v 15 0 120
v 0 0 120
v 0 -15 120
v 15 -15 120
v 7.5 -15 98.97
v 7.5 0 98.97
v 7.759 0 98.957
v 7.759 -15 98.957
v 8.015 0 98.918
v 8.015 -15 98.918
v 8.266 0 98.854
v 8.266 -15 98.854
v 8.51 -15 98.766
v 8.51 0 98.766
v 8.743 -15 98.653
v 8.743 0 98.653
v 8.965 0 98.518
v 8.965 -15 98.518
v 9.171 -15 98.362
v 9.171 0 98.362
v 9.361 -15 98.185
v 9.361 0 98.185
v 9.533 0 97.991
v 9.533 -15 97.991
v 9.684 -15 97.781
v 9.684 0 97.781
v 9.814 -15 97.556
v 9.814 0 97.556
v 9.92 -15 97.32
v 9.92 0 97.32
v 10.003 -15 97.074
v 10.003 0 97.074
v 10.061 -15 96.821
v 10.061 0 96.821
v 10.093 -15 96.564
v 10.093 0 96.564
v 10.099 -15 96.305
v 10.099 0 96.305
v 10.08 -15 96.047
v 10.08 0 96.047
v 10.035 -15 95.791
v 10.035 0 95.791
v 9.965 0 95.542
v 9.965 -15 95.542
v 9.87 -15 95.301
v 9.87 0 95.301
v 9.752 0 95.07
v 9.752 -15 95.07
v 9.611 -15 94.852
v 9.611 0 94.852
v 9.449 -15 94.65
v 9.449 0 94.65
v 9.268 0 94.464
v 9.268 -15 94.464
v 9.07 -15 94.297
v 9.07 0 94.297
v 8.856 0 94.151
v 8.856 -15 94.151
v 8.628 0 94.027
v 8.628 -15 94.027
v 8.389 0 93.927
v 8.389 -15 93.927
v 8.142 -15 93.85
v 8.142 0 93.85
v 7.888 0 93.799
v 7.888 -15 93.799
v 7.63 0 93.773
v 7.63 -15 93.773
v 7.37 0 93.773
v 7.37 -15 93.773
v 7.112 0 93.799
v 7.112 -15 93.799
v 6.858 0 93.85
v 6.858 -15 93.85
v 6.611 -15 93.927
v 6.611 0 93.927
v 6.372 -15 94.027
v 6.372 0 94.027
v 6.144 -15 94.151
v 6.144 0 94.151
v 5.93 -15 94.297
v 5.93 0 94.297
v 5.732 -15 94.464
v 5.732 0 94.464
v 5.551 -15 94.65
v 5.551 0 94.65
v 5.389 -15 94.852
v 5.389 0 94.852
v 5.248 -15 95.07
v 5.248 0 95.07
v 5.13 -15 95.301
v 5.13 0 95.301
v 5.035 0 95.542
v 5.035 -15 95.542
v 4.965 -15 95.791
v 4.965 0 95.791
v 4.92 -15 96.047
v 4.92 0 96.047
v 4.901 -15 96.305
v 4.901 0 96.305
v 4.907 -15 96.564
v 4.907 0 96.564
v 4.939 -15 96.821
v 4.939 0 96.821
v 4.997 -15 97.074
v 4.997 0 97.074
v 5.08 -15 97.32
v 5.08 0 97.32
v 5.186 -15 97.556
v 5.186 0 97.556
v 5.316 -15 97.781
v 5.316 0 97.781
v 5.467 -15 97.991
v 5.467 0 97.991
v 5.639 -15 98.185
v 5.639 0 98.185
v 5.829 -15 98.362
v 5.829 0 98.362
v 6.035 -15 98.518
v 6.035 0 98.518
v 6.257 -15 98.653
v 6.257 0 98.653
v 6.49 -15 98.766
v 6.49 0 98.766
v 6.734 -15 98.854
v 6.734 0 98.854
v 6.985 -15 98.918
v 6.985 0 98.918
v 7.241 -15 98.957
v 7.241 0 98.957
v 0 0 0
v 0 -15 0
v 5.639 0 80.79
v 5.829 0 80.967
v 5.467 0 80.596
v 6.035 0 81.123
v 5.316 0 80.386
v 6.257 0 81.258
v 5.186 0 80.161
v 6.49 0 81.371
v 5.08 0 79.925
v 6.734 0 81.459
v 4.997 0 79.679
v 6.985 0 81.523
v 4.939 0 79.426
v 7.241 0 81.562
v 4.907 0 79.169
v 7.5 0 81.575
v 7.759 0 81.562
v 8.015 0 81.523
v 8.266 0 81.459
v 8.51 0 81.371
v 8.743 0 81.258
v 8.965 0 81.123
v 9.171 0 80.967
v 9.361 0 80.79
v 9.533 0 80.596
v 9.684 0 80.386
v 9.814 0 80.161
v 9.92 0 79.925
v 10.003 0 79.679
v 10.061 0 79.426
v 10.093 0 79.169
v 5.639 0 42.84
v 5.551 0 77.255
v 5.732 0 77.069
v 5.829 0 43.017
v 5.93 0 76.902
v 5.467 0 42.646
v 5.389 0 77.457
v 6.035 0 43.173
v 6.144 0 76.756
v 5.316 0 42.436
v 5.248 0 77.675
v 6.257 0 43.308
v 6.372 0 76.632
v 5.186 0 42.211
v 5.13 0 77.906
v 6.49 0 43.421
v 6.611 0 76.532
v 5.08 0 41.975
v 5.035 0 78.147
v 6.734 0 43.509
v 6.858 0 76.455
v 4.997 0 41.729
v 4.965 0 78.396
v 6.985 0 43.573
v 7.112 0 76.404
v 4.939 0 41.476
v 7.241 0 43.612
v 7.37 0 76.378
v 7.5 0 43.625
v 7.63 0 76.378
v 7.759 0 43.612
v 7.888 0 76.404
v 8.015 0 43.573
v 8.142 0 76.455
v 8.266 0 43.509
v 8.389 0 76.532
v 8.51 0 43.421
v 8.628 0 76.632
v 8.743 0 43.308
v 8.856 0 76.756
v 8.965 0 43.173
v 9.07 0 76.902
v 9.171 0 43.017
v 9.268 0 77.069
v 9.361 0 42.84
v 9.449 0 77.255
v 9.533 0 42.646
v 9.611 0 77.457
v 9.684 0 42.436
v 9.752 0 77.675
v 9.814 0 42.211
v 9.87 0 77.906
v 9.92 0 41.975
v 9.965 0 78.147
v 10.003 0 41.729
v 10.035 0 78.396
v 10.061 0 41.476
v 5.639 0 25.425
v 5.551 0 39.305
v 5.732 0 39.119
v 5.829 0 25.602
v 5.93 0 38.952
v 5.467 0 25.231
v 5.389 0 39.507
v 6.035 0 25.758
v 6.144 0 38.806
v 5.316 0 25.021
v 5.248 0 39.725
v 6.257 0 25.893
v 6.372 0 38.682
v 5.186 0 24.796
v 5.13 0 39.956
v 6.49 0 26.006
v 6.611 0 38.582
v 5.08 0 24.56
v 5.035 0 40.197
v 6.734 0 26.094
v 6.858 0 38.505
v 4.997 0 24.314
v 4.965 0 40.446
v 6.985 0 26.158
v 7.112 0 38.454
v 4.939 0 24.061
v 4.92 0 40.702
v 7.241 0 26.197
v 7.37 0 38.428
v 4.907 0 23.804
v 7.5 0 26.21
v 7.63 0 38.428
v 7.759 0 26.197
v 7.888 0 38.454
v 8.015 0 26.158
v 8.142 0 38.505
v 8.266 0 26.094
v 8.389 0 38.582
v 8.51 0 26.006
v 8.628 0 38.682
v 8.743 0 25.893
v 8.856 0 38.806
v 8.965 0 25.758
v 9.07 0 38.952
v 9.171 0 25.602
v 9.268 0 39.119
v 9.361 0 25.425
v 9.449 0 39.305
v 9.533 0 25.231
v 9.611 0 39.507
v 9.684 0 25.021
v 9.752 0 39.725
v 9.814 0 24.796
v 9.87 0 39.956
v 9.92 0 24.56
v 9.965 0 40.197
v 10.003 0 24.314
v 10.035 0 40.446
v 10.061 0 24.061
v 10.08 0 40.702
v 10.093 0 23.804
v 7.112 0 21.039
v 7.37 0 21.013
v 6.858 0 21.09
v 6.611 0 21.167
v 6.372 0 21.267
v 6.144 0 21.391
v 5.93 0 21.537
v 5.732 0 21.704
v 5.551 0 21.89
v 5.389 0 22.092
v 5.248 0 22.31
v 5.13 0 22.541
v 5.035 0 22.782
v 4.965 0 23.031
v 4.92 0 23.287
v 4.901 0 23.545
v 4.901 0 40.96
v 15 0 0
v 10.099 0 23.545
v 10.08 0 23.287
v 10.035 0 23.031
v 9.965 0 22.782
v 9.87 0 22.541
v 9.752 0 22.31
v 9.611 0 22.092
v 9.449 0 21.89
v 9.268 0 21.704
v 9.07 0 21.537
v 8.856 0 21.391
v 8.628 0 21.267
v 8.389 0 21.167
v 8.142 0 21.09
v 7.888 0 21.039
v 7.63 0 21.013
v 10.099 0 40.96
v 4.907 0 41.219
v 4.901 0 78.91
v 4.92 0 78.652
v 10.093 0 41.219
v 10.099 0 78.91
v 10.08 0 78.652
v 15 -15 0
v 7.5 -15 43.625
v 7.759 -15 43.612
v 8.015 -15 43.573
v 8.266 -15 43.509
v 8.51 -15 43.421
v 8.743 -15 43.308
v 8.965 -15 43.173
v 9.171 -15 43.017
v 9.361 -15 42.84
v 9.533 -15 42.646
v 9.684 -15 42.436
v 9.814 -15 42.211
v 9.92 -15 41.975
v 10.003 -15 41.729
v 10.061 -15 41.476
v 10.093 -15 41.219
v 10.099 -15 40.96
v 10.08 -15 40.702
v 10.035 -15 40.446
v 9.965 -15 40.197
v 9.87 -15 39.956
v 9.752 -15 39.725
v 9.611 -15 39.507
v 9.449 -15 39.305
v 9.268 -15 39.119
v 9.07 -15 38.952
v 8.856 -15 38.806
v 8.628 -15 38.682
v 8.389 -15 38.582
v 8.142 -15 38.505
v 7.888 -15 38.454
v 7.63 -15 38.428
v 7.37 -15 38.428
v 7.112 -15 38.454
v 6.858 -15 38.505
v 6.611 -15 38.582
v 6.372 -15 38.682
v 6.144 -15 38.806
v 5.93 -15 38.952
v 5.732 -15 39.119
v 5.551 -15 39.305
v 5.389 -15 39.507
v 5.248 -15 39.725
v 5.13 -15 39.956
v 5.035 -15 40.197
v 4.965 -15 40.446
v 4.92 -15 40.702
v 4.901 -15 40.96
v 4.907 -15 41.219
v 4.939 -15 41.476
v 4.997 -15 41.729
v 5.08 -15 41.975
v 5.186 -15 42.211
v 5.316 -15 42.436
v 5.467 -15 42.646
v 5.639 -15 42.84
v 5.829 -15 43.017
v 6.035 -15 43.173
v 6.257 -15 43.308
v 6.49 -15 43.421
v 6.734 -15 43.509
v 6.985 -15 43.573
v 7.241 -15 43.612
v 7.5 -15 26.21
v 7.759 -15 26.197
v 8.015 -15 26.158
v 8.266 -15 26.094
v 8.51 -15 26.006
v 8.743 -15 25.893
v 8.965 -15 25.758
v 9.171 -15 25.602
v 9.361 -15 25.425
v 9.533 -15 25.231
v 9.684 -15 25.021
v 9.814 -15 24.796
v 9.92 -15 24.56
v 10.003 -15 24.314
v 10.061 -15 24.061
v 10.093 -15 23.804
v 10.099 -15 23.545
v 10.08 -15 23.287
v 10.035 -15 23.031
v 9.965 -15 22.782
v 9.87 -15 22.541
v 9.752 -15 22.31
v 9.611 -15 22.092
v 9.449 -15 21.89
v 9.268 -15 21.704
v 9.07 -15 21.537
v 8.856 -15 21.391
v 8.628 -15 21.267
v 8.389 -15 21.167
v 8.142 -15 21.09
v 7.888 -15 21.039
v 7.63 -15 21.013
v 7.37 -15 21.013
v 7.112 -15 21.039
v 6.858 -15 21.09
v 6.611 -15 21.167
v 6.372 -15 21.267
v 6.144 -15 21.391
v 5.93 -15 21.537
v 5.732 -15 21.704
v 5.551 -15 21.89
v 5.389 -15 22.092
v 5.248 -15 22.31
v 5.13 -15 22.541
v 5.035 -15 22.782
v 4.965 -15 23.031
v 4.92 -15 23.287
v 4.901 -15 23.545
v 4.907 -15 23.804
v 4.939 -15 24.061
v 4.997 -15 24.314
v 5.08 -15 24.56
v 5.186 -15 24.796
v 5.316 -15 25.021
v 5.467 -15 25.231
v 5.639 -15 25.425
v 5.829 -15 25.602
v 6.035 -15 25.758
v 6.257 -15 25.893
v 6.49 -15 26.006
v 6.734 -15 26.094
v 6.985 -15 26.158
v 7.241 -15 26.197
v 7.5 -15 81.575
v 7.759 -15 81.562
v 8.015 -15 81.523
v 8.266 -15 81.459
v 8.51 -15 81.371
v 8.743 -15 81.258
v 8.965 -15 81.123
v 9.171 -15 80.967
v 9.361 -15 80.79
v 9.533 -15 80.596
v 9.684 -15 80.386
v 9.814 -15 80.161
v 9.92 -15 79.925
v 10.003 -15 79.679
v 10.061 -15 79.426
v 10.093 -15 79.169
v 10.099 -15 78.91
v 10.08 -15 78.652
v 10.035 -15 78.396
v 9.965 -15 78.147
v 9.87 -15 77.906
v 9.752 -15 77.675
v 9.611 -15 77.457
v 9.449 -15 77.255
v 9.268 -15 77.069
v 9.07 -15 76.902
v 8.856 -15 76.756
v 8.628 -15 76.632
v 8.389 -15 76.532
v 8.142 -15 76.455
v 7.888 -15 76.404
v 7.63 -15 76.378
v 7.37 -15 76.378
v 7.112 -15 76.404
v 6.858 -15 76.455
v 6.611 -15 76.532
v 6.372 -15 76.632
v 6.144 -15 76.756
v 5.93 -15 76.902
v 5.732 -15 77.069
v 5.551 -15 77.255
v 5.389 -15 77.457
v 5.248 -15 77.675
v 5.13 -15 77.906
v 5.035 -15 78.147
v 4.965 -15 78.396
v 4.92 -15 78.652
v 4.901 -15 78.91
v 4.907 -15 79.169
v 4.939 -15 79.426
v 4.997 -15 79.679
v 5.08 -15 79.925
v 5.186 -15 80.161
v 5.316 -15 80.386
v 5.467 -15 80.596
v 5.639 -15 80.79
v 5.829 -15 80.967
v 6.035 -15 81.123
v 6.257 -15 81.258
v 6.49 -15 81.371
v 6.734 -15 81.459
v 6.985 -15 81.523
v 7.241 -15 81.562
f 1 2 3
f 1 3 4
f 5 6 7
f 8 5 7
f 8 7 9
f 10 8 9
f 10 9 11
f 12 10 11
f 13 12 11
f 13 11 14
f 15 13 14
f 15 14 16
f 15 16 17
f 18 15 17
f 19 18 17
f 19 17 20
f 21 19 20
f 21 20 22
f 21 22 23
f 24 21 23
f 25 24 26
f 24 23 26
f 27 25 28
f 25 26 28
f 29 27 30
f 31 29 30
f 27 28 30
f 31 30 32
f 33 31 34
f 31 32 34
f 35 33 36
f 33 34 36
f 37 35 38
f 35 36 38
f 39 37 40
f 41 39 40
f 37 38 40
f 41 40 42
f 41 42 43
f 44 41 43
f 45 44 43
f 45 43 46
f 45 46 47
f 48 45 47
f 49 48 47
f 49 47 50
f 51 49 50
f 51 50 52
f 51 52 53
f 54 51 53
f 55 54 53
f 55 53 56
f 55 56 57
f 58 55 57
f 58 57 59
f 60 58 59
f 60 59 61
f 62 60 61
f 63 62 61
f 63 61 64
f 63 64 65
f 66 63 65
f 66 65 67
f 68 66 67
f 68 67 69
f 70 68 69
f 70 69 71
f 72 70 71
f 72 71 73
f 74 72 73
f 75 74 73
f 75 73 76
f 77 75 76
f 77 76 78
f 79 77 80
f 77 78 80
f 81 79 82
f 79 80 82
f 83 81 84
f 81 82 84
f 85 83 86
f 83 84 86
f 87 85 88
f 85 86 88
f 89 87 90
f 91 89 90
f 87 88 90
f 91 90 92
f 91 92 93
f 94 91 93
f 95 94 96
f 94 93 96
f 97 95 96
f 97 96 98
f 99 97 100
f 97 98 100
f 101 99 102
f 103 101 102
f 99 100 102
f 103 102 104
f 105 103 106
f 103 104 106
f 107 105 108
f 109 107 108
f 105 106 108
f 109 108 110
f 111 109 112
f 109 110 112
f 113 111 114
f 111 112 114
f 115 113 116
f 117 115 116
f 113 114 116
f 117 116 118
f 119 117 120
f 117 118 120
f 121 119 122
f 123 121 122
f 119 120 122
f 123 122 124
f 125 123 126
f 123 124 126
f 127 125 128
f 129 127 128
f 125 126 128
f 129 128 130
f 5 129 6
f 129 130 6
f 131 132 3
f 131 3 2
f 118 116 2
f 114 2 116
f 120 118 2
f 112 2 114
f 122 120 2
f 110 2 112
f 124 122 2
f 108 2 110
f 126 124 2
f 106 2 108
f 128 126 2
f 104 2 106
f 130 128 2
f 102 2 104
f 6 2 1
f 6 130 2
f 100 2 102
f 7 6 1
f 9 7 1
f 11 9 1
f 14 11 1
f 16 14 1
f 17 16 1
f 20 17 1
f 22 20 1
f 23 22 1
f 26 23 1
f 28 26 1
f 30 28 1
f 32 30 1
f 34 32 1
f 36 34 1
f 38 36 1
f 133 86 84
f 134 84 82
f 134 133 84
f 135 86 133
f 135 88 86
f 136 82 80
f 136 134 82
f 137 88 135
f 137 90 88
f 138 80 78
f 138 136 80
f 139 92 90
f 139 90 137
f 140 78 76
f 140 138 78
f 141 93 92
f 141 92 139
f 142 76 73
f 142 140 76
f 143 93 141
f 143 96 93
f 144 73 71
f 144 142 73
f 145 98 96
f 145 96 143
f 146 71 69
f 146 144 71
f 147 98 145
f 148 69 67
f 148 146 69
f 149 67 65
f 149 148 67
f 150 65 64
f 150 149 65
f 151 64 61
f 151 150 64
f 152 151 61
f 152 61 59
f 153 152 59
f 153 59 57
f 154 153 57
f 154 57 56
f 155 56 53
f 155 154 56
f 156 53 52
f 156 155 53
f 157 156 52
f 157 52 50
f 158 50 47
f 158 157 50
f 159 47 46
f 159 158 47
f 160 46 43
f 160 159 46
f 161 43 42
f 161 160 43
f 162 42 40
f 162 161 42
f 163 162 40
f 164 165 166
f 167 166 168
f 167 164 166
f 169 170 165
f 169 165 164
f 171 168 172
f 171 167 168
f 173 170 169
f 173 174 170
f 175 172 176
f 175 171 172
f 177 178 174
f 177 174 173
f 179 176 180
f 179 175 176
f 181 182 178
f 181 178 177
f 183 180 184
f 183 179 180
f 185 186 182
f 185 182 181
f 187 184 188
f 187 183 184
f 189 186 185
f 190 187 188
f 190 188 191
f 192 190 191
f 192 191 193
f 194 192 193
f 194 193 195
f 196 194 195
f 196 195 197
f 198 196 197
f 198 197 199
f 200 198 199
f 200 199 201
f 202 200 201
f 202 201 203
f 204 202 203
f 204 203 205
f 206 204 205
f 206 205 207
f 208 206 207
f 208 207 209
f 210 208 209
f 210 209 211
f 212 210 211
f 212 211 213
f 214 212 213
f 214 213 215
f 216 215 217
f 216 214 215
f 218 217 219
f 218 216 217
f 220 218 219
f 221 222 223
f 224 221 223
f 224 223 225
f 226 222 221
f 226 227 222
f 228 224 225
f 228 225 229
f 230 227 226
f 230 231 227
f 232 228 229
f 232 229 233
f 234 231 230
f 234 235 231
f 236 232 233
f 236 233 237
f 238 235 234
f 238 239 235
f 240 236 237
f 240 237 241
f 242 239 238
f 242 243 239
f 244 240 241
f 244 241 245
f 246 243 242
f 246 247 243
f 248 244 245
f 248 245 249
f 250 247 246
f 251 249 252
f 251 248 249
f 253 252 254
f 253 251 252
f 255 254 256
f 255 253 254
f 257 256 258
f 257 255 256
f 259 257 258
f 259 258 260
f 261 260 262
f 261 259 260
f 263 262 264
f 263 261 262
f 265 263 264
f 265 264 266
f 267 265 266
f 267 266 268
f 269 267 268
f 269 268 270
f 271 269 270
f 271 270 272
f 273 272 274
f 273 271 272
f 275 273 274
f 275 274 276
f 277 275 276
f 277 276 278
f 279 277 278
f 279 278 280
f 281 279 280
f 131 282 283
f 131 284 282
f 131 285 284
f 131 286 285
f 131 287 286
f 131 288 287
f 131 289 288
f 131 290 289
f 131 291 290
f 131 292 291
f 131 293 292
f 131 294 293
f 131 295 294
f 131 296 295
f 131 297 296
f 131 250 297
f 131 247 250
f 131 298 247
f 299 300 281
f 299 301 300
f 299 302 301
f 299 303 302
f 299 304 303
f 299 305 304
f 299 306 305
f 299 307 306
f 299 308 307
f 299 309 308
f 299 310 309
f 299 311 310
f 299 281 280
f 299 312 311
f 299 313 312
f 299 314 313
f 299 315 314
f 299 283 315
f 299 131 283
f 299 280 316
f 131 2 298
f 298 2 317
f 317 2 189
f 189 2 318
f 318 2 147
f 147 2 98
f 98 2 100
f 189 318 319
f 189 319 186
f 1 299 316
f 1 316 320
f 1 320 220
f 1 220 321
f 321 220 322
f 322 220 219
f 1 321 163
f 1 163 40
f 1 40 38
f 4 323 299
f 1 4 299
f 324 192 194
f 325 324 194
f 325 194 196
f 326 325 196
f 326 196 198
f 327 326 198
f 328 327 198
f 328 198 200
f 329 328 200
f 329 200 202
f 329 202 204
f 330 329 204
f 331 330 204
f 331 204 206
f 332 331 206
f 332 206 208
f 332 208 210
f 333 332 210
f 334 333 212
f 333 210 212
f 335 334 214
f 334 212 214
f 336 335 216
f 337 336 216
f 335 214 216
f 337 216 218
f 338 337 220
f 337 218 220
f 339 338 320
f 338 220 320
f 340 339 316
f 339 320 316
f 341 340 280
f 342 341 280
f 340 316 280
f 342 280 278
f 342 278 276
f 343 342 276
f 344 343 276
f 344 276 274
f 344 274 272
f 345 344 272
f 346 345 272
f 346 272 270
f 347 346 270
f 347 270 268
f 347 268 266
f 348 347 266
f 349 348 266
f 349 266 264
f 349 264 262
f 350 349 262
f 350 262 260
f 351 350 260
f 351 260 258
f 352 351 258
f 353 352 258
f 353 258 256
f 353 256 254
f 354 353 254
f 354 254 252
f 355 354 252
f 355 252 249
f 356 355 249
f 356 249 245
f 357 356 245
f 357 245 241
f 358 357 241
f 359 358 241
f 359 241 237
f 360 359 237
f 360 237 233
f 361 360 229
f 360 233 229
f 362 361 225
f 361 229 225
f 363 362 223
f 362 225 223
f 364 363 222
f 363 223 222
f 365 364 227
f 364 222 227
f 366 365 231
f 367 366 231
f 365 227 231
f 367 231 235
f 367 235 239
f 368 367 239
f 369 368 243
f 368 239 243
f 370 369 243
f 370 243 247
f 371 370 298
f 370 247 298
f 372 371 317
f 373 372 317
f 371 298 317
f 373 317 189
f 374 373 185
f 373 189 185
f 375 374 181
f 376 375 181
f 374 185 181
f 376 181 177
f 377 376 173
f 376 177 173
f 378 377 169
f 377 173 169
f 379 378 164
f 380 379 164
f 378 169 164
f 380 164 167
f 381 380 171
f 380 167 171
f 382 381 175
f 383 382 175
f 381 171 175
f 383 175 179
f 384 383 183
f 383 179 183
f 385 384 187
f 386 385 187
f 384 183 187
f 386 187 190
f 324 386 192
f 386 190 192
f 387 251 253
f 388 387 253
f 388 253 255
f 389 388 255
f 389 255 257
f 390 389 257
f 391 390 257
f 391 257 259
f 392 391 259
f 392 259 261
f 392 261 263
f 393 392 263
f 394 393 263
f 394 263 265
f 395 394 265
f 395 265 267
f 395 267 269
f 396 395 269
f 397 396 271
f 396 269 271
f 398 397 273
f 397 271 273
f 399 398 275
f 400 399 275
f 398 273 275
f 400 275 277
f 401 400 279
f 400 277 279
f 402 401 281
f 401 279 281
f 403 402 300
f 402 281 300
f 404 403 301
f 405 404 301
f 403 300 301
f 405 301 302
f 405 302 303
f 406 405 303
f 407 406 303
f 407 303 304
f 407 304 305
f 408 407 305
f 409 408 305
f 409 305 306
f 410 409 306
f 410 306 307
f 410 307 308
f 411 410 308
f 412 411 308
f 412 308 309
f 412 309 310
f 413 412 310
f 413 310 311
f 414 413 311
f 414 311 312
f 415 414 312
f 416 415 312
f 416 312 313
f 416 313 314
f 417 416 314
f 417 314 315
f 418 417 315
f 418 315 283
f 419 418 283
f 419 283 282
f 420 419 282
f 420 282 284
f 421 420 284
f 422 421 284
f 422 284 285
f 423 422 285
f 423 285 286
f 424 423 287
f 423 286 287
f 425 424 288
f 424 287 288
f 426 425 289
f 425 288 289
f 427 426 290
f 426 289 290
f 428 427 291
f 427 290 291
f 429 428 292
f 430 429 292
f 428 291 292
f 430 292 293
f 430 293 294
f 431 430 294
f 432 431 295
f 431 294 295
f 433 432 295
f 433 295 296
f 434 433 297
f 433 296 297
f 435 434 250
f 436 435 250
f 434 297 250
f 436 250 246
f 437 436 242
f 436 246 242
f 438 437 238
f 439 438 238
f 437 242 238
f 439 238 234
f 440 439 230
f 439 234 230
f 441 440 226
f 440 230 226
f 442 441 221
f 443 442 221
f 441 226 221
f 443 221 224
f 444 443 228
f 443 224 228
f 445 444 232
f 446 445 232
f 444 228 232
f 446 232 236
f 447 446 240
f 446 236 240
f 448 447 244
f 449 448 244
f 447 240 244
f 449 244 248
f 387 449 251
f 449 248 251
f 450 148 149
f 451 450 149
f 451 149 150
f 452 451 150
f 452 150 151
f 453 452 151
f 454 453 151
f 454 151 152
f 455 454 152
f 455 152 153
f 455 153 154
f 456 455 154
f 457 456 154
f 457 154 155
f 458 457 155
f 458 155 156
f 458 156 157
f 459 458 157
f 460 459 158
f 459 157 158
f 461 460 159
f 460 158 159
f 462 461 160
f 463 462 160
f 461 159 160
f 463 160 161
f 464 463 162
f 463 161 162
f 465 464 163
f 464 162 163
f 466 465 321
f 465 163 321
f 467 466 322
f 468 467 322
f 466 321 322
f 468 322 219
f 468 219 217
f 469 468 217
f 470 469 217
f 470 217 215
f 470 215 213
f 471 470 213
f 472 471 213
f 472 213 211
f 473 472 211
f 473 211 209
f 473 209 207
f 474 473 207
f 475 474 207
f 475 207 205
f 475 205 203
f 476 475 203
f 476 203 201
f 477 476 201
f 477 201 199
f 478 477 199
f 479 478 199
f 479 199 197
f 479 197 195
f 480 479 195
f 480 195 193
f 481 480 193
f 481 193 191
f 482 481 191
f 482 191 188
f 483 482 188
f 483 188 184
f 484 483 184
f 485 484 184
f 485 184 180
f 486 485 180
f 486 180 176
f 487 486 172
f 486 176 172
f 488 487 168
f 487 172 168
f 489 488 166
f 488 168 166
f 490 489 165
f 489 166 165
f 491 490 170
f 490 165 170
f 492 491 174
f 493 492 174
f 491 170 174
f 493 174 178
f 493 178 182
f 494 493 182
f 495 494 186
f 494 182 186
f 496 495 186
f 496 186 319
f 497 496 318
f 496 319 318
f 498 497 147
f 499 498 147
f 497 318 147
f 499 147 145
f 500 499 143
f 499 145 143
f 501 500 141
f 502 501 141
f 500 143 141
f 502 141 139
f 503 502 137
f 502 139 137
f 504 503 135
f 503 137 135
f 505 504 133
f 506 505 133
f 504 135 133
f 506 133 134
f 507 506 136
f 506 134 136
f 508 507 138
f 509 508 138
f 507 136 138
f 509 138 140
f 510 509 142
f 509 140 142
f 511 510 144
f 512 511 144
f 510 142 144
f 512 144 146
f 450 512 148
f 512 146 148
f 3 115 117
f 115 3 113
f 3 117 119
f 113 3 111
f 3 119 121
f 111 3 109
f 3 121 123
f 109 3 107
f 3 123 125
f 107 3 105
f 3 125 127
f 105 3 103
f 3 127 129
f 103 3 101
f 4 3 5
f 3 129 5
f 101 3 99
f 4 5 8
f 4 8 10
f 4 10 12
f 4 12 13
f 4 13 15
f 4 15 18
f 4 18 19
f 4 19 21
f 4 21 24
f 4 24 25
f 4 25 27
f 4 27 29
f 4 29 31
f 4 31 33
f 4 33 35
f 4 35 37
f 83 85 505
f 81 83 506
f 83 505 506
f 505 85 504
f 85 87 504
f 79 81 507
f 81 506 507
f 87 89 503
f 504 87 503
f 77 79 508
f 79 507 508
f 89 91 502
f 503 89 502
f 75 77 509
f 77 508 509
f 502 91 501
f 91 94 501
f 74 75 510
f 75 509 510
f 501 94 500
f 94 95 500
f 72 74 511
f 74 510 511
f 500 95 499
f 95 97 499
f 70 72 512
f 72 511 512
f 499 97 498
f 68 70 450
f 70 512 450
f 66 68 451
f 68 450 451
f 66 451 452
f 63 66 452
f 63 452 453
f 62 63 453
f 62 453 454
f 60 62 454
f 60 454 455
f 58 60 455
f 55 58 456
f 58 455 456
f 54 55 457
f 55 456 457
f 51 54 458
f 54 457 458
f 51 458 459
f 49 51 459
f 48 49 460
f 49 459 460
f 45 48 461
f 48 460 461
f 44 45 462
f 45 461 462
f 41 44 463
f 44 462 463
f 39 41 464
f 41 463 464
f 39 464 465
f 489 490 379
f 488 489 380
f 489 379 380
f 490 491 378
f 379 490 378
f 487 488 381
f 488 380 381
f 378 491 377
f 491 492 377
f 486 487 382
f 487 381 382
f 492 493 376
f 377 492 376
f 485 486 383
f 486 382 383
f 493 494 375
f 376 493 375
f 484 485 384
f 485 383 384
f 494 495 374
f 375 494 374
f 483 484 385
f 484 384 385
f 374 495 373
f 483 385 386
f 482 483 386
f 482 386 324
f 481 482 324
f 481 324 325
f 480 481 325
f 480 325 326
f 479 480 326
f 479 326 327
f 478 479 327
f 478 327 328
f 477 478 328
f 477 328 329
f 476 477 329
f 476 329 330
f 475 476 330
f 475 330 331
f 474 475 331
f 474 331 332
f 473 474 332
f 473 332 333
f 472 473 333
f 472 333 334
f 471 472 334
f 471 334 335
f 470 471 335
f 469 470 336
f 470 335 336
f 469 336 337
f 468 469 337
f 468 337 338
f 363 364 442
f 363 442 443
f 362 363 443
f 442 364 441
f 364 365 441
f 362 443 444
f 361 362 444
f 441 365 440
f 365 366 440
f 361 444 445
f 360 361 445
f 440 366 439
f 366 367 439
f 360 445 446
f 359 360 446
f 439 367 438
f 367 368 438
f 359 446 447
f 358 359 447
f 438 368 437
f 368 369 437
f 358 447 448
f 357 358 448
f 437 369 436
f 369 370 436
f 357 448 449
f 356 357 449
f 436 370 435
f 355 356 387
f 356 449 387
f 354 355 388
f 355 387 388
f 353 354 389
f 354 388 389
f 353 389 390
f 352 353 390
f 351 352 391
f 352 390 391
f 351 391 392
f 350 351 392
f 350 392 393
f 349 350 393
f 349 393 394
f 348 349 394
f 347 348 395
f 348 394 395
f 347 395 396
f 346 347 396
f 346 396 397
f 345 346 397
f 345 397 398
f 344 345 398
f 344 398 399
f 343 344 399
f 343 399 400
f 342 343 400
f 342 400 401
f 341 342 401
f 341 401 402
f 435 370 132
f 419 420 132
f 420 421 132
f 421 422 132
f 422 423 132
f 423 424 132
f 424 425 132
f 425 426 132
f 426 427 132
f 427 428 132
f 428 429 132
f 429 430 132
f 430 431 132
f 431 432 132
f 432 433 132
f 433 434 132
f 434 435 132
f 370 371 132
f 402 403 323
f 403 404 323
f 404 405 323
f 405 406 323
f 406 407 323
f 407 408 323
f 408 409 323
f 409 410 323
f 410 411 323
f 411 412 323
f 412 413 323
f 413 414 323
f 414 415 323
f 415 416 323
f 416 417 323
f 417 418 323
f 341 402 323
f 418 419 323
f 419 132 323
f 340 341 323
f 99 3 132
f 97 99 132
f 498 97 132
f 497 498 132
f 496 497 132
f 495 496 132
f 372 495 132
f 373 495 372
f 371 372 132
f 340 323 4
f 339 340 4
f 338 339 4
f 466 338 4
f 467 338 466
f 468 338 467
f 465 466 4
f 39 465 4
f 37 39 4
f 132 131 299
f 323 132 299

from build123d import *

# Parameters (mm, degrees)
SKETCH_1_W          = 15
SKETCH_1_H          = 15
EXTRUDE_1_DEPTH     = 120
SKETCH_2_R          = 2.6
CUT_EXTRUDE_1_DEPTH = 122.86057607


with BuildPart() as part:
    # 草图1 → 凸台-拉伸1 (new body)
    with BuildSketch(Plane.XY):
        with Locations((7.5, -7.5)):
            Rectangle(SKETCH_1_W, SKETCH_1_H)
    extrude(amount=EXTRUDE_1_DEPTH)

    # 草图2 → 切除-拉伸1 (cut, through all)
    with BuildSketch(Plane(origin=(0, 0, 0), x_dir=(1, 0, 0), z_dir=(0, 1, 0))):
        with Locations(Location((7.5, -23.61, 0), (0, 0, 270))):
            Circle(SKETCH_2_R)
        with Locations(Location((7.5, -96.37, 0), (0, 0, 270))):
            Circle(SKETCH_2_R)
        with Locations(Location((7.5, -41.025, 0), (0, 0, 270))):
            Circle(SKETCH_2_R)
        with Locations(Location((7.5, -78.975, 0), (0, 0, 270))):
            Circle(SKETCH_2_R)
    extrude(amount=-CUT_EXTRUDE_1_DEPTH, mode=Mode.SUBTRACT)


solid = part.part
